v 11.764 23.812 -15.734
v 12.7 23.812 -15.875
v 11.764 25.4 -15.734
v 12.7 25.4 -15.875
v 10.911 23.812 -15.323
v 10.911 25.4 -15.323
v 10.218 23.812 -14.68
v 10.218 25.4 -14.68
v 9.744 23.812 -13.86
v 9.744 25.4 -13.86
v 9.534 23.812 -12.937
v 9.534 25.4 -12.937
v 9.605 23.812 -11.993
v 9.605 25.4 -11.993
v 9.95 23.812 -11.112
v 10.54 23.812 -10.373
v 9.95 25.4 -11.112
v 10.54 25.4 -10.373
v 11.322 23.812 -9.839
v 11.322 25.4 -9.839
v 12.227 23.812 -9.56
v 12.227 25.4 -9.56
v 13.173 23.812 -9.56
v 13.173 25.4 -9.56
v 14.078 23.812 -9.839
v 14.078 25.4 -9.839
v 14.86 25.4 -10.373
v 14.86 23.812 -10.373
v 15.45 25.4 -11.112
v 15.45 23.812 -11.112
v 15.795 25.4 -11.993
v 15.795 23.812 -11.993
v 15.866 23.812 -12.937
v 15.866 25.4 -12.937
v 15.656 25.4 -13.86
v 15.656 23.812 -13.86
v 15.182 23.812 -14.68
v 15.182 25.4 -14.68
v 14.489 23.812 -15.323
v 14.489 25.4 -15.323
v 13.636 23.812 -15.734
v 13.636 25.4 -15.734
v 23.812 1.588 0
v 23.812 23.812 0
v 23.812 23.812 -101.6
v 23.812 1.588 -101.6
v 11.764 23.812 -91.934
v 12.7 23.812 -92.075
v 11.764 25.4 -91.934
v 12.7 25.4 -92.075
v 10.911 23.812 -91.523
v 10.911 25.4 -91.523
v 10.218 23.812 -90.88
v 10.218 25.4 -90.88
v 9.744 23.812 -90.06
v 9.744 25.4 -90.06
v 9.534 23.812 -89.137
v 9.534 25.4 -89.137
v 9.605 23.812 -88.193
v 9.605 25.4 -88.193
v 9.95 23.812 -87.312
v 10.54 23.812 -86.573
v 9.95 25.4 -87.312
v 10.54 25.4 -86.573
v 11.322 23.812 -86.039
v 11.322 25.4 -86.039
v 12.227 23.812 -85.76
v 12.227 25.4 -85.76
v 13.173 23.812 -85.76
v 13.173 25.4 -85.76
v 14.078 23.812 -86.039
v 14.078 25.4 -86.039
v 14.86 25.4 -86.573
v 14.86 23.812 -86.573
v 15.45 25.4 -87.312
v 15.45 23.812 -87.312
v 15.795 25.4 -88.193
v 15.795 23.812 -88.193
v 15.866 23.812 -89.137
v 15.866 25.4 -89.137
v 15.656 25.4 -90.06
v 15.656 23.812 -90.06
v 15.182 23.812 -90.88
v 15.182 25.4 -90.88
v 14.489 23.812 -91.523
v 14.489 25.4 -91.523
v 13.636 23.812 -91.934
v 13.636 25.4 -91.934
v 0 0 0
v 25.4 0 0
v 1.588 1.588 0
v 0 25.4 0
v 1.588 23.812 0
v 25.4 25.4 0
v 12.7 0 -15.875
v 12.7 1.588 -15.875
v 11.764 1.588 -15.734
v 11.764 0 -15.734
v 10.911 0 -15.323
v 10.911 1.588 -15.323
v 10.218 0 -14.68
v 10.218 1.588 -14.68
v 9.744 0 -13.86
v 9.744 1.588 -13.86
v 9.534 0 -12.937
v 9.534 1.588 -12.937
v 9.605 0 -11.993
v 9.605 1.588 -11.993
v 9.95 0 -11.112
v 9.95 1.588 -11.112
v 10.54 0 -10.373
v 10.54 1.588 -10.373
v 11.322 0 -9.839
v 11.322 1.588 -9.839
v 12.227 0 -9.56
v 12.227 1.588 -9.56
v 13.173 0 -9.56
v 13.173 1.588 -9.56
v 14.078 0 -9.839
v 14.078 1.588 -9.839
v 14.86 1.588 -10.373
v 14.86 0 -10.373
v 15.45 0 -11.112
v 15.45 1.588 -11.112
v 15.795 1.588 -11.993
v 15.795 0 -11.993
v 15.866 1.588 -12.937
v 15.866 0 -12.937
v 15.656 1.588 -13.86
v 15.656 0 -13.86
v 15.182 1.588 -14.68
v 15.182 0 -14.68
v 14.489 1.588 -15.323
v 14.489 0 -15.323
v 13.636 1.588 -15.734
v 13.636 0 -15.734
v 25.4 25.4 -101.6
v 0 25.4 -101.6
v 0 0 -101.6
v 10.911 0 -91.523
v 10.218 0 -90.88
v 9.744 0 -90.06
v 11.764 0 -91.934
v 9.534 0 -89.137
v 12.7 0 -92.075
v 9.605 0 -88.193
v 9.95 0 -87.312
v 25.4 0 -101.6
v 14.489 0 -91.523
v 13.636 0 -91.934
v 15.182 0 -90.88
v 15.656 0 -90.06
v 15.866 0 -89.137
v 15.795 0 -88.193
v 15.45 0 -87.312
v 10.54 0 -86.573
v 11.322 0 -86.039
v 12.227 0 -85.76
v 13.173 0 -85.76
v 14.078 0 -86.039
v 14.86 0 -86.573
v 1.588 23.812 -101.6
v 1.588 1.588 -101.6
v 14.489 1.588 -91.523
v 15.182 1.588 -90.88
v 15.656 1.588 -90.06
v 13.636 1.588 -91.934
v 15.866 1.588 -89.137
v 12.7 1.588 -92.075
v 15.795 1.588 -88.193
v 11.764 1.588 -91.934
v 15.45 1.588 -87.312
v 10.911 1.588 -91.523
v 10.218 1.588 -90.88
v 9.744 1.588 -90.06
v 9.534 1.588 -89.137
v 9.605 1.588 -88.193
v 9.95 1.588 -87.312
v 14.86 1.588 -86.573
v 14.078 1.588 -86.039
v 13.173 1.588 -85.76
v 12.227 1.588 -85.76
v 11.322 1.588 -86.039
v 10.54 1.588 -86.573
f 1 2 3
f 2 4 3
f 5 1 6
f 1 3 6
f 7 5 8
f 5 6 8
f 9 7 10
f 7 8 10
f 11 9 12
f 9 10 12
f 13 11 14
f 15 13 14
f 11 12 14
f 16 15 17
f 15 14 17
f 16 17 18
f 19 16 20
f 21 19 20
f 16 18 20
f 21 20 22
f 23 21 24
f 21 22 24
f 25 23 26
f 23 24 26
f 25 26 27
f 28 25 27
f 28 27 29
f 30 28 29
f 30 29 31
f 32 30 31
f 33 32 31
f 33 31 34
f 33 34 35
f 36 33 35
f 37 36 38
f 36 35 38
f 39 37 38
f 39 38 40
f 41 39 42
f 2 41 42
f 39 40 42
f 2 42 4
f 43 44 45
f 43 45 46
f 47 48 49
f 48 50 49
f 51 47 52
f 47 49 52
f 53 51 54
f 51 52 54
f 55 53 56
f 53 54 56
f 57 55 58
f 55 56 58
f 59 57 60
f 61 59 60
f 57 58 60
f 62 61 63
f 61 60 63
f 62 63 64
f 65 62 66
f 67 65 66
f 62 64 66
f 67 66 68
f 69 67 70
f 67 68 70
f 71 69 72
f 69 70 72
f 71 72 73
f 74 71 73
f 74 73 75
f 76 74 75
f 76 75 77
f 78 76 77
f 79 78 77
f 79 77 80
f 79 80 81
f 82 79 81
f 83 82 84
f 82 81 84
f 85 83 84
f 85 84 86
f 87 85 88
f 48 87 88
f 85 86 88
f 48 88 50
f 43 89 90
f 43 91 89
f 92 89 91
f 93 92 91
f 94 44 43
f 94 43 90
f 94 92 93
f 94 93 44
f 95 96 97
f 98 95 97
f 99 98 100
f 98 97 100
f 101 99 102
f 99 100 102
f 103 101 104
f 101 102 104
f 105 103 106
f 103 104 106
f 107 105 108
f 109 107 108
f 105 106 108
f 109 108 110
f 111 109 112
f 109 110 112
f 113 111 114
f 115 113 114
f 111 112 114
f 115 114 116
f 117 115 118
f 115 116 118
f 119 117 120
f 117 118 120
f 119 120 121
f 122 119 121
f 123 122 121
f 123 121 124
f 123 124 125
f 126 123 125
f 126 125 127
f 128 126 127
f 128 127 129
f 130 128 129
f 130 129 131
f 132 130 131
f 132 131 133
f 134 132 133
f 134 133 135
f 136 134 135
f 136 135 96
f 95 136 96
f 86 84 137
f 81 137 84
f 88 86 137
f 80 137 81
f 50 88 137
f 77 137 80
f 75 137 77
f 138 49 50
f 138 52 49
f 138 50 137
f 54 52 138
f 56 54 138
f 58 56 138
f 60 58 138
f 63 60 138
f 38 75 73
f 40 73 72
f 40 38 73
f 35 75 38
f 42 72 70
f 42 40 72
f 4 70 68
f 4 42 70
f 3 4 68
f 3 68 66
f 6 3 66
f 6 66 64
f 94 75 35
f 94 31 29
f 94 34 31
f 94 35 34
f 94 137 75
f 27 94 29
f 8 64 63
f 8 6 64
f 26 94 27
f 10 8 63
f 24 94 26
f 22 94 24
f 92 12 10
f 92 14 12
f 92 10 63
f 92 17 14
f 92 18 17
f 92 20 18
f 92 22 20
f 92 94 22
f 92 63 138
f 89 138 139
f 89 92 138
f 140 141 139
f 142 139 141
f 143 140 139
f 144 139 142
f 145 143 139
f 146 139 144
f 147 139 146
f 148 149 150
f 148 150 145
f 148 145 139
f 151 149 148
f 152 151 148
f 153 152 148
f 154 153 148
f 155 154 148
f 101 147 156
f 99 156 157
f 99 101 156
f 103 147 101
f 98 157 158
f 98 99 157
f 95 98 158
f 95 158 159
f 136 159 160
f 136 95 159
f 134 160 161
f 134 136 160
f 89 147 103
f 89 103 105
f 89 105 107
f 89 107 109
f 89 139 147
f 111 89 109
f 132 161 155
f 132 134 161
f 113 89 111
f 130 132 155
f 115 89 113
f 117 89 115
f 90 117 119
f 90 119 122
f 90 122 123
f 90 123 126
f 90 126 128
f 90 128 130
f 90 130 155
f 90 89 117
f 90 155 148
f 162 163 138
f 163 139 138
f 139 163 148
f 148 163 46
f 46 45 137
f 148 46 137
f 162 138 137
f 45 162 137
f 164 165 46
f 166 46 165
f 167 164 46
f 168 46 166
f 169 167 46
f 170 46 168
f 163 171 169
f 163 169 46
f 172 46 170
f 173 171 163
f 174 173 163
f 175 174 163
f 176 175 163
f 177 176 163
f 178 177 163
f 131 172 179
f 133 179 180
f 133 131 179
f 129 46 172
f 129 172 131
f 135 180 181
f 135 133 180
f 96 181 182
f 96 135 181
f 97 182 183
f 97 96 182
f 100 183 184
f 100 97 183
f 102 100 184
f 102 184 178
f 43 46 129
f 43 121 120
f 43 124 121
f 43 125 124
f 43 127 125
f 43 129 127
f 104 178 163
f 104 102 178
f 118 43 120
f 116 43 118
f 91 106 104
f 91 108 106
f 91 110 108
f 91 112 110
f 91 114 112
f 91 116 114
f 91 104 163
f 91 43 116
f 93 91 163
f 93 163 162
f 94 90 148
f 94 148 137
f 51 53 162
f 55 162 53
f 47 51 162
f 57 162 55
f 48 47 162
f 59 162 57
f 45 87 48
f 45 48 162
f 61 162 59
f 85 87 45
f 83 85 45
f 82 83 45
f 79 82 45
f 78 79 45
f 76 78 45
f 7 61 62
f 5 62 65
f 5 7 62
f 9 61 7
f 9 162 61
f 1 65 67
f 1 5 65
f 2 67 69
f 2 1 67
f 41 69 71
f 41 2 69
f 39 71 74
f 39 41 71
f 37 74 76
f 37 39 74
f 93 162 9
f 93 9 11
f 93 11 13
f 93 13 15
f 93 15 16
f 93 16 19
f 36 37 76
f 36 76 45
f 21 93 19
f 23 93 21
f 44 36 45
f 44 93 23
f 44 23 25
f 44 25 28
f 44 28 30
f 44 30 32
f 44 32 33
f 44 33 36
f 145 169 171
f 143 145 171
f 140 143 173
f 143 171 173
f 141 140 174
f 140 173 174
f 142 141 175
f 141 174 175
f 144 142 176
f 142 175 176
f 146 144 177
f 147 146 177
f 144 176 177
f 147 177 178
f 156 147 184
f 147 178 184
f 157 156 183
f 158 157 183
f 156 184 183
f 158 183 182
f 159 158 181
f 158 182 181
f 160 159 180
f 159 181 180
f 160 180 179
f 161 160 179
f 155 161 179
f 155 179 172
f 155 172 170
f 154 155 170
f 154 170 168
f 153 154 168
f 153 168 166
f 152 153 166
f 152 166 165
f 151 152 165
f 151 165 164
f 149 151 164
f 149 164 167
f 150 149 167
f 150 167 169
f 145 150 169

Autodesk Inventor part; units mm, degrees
ref_plane "YZ Plane" through (0, 0, 0) normal (1, 0, 0) x (0, 1, 0)
ref_plane "XZ Plane" through (0, 0, 0) normal (0, 1, 0) x (-1, 0, 0)
ref_plane "XY Plane" through (0, 0, 0) normal (0, 0, 1) x (1, 0, 0)
sketch "Sketch1" plane through (0, 0, 0) normal (0, 0, 1) x (1, 0, 0)
  line L0 (0, 0) -> (25.4, 0)
  line L1 (25.4, 0) -> (25.4, 25.4)
  line L2 (25.4, 25.4) -> (0, 25.4)
  line L3 (0, 25.4) -> (0, 0)
  line L4 (1.5875, 23.8125) -> (23.8125, 23.8125)
  line L5 (23.8125, 23.8125) -> (23.8125, 1.5875)
  line L6 (23.8125, 1.5875) -> (1.5875, 1.5875)
  line L7 (1.5875, 1.5875) -> (1.5875, 23.8125)
  dimension "d0" = 25.4
  dimension "d1" = 25.4
  dimension "d2" = 1.5875
extrude "Extrusion1" add sketch "Sketch1" against normal blind 101.6
sketch "Sketch3" plane through (0, 0, 0) normal (0, -1, 0) x (1, 0, 0)
  line L0 (0, -101.6) -> (25.4, -101.6) projected
  line L1 (0, 0) -> (25.4, 0) projected
  point P0 (12.7, -12.7)
  point P1 (12.7, -88.9)
  dimension "d7" = 12.7
  dimension "d8" = 12.7
hole "Hole2" at (12.7, 0, -12.7) at (12.7, 0, -88.9) direction (0, 1, 0) diameter 6.35 depth 25.4 tip angle 118
properties part number "tube_r_f_in"
